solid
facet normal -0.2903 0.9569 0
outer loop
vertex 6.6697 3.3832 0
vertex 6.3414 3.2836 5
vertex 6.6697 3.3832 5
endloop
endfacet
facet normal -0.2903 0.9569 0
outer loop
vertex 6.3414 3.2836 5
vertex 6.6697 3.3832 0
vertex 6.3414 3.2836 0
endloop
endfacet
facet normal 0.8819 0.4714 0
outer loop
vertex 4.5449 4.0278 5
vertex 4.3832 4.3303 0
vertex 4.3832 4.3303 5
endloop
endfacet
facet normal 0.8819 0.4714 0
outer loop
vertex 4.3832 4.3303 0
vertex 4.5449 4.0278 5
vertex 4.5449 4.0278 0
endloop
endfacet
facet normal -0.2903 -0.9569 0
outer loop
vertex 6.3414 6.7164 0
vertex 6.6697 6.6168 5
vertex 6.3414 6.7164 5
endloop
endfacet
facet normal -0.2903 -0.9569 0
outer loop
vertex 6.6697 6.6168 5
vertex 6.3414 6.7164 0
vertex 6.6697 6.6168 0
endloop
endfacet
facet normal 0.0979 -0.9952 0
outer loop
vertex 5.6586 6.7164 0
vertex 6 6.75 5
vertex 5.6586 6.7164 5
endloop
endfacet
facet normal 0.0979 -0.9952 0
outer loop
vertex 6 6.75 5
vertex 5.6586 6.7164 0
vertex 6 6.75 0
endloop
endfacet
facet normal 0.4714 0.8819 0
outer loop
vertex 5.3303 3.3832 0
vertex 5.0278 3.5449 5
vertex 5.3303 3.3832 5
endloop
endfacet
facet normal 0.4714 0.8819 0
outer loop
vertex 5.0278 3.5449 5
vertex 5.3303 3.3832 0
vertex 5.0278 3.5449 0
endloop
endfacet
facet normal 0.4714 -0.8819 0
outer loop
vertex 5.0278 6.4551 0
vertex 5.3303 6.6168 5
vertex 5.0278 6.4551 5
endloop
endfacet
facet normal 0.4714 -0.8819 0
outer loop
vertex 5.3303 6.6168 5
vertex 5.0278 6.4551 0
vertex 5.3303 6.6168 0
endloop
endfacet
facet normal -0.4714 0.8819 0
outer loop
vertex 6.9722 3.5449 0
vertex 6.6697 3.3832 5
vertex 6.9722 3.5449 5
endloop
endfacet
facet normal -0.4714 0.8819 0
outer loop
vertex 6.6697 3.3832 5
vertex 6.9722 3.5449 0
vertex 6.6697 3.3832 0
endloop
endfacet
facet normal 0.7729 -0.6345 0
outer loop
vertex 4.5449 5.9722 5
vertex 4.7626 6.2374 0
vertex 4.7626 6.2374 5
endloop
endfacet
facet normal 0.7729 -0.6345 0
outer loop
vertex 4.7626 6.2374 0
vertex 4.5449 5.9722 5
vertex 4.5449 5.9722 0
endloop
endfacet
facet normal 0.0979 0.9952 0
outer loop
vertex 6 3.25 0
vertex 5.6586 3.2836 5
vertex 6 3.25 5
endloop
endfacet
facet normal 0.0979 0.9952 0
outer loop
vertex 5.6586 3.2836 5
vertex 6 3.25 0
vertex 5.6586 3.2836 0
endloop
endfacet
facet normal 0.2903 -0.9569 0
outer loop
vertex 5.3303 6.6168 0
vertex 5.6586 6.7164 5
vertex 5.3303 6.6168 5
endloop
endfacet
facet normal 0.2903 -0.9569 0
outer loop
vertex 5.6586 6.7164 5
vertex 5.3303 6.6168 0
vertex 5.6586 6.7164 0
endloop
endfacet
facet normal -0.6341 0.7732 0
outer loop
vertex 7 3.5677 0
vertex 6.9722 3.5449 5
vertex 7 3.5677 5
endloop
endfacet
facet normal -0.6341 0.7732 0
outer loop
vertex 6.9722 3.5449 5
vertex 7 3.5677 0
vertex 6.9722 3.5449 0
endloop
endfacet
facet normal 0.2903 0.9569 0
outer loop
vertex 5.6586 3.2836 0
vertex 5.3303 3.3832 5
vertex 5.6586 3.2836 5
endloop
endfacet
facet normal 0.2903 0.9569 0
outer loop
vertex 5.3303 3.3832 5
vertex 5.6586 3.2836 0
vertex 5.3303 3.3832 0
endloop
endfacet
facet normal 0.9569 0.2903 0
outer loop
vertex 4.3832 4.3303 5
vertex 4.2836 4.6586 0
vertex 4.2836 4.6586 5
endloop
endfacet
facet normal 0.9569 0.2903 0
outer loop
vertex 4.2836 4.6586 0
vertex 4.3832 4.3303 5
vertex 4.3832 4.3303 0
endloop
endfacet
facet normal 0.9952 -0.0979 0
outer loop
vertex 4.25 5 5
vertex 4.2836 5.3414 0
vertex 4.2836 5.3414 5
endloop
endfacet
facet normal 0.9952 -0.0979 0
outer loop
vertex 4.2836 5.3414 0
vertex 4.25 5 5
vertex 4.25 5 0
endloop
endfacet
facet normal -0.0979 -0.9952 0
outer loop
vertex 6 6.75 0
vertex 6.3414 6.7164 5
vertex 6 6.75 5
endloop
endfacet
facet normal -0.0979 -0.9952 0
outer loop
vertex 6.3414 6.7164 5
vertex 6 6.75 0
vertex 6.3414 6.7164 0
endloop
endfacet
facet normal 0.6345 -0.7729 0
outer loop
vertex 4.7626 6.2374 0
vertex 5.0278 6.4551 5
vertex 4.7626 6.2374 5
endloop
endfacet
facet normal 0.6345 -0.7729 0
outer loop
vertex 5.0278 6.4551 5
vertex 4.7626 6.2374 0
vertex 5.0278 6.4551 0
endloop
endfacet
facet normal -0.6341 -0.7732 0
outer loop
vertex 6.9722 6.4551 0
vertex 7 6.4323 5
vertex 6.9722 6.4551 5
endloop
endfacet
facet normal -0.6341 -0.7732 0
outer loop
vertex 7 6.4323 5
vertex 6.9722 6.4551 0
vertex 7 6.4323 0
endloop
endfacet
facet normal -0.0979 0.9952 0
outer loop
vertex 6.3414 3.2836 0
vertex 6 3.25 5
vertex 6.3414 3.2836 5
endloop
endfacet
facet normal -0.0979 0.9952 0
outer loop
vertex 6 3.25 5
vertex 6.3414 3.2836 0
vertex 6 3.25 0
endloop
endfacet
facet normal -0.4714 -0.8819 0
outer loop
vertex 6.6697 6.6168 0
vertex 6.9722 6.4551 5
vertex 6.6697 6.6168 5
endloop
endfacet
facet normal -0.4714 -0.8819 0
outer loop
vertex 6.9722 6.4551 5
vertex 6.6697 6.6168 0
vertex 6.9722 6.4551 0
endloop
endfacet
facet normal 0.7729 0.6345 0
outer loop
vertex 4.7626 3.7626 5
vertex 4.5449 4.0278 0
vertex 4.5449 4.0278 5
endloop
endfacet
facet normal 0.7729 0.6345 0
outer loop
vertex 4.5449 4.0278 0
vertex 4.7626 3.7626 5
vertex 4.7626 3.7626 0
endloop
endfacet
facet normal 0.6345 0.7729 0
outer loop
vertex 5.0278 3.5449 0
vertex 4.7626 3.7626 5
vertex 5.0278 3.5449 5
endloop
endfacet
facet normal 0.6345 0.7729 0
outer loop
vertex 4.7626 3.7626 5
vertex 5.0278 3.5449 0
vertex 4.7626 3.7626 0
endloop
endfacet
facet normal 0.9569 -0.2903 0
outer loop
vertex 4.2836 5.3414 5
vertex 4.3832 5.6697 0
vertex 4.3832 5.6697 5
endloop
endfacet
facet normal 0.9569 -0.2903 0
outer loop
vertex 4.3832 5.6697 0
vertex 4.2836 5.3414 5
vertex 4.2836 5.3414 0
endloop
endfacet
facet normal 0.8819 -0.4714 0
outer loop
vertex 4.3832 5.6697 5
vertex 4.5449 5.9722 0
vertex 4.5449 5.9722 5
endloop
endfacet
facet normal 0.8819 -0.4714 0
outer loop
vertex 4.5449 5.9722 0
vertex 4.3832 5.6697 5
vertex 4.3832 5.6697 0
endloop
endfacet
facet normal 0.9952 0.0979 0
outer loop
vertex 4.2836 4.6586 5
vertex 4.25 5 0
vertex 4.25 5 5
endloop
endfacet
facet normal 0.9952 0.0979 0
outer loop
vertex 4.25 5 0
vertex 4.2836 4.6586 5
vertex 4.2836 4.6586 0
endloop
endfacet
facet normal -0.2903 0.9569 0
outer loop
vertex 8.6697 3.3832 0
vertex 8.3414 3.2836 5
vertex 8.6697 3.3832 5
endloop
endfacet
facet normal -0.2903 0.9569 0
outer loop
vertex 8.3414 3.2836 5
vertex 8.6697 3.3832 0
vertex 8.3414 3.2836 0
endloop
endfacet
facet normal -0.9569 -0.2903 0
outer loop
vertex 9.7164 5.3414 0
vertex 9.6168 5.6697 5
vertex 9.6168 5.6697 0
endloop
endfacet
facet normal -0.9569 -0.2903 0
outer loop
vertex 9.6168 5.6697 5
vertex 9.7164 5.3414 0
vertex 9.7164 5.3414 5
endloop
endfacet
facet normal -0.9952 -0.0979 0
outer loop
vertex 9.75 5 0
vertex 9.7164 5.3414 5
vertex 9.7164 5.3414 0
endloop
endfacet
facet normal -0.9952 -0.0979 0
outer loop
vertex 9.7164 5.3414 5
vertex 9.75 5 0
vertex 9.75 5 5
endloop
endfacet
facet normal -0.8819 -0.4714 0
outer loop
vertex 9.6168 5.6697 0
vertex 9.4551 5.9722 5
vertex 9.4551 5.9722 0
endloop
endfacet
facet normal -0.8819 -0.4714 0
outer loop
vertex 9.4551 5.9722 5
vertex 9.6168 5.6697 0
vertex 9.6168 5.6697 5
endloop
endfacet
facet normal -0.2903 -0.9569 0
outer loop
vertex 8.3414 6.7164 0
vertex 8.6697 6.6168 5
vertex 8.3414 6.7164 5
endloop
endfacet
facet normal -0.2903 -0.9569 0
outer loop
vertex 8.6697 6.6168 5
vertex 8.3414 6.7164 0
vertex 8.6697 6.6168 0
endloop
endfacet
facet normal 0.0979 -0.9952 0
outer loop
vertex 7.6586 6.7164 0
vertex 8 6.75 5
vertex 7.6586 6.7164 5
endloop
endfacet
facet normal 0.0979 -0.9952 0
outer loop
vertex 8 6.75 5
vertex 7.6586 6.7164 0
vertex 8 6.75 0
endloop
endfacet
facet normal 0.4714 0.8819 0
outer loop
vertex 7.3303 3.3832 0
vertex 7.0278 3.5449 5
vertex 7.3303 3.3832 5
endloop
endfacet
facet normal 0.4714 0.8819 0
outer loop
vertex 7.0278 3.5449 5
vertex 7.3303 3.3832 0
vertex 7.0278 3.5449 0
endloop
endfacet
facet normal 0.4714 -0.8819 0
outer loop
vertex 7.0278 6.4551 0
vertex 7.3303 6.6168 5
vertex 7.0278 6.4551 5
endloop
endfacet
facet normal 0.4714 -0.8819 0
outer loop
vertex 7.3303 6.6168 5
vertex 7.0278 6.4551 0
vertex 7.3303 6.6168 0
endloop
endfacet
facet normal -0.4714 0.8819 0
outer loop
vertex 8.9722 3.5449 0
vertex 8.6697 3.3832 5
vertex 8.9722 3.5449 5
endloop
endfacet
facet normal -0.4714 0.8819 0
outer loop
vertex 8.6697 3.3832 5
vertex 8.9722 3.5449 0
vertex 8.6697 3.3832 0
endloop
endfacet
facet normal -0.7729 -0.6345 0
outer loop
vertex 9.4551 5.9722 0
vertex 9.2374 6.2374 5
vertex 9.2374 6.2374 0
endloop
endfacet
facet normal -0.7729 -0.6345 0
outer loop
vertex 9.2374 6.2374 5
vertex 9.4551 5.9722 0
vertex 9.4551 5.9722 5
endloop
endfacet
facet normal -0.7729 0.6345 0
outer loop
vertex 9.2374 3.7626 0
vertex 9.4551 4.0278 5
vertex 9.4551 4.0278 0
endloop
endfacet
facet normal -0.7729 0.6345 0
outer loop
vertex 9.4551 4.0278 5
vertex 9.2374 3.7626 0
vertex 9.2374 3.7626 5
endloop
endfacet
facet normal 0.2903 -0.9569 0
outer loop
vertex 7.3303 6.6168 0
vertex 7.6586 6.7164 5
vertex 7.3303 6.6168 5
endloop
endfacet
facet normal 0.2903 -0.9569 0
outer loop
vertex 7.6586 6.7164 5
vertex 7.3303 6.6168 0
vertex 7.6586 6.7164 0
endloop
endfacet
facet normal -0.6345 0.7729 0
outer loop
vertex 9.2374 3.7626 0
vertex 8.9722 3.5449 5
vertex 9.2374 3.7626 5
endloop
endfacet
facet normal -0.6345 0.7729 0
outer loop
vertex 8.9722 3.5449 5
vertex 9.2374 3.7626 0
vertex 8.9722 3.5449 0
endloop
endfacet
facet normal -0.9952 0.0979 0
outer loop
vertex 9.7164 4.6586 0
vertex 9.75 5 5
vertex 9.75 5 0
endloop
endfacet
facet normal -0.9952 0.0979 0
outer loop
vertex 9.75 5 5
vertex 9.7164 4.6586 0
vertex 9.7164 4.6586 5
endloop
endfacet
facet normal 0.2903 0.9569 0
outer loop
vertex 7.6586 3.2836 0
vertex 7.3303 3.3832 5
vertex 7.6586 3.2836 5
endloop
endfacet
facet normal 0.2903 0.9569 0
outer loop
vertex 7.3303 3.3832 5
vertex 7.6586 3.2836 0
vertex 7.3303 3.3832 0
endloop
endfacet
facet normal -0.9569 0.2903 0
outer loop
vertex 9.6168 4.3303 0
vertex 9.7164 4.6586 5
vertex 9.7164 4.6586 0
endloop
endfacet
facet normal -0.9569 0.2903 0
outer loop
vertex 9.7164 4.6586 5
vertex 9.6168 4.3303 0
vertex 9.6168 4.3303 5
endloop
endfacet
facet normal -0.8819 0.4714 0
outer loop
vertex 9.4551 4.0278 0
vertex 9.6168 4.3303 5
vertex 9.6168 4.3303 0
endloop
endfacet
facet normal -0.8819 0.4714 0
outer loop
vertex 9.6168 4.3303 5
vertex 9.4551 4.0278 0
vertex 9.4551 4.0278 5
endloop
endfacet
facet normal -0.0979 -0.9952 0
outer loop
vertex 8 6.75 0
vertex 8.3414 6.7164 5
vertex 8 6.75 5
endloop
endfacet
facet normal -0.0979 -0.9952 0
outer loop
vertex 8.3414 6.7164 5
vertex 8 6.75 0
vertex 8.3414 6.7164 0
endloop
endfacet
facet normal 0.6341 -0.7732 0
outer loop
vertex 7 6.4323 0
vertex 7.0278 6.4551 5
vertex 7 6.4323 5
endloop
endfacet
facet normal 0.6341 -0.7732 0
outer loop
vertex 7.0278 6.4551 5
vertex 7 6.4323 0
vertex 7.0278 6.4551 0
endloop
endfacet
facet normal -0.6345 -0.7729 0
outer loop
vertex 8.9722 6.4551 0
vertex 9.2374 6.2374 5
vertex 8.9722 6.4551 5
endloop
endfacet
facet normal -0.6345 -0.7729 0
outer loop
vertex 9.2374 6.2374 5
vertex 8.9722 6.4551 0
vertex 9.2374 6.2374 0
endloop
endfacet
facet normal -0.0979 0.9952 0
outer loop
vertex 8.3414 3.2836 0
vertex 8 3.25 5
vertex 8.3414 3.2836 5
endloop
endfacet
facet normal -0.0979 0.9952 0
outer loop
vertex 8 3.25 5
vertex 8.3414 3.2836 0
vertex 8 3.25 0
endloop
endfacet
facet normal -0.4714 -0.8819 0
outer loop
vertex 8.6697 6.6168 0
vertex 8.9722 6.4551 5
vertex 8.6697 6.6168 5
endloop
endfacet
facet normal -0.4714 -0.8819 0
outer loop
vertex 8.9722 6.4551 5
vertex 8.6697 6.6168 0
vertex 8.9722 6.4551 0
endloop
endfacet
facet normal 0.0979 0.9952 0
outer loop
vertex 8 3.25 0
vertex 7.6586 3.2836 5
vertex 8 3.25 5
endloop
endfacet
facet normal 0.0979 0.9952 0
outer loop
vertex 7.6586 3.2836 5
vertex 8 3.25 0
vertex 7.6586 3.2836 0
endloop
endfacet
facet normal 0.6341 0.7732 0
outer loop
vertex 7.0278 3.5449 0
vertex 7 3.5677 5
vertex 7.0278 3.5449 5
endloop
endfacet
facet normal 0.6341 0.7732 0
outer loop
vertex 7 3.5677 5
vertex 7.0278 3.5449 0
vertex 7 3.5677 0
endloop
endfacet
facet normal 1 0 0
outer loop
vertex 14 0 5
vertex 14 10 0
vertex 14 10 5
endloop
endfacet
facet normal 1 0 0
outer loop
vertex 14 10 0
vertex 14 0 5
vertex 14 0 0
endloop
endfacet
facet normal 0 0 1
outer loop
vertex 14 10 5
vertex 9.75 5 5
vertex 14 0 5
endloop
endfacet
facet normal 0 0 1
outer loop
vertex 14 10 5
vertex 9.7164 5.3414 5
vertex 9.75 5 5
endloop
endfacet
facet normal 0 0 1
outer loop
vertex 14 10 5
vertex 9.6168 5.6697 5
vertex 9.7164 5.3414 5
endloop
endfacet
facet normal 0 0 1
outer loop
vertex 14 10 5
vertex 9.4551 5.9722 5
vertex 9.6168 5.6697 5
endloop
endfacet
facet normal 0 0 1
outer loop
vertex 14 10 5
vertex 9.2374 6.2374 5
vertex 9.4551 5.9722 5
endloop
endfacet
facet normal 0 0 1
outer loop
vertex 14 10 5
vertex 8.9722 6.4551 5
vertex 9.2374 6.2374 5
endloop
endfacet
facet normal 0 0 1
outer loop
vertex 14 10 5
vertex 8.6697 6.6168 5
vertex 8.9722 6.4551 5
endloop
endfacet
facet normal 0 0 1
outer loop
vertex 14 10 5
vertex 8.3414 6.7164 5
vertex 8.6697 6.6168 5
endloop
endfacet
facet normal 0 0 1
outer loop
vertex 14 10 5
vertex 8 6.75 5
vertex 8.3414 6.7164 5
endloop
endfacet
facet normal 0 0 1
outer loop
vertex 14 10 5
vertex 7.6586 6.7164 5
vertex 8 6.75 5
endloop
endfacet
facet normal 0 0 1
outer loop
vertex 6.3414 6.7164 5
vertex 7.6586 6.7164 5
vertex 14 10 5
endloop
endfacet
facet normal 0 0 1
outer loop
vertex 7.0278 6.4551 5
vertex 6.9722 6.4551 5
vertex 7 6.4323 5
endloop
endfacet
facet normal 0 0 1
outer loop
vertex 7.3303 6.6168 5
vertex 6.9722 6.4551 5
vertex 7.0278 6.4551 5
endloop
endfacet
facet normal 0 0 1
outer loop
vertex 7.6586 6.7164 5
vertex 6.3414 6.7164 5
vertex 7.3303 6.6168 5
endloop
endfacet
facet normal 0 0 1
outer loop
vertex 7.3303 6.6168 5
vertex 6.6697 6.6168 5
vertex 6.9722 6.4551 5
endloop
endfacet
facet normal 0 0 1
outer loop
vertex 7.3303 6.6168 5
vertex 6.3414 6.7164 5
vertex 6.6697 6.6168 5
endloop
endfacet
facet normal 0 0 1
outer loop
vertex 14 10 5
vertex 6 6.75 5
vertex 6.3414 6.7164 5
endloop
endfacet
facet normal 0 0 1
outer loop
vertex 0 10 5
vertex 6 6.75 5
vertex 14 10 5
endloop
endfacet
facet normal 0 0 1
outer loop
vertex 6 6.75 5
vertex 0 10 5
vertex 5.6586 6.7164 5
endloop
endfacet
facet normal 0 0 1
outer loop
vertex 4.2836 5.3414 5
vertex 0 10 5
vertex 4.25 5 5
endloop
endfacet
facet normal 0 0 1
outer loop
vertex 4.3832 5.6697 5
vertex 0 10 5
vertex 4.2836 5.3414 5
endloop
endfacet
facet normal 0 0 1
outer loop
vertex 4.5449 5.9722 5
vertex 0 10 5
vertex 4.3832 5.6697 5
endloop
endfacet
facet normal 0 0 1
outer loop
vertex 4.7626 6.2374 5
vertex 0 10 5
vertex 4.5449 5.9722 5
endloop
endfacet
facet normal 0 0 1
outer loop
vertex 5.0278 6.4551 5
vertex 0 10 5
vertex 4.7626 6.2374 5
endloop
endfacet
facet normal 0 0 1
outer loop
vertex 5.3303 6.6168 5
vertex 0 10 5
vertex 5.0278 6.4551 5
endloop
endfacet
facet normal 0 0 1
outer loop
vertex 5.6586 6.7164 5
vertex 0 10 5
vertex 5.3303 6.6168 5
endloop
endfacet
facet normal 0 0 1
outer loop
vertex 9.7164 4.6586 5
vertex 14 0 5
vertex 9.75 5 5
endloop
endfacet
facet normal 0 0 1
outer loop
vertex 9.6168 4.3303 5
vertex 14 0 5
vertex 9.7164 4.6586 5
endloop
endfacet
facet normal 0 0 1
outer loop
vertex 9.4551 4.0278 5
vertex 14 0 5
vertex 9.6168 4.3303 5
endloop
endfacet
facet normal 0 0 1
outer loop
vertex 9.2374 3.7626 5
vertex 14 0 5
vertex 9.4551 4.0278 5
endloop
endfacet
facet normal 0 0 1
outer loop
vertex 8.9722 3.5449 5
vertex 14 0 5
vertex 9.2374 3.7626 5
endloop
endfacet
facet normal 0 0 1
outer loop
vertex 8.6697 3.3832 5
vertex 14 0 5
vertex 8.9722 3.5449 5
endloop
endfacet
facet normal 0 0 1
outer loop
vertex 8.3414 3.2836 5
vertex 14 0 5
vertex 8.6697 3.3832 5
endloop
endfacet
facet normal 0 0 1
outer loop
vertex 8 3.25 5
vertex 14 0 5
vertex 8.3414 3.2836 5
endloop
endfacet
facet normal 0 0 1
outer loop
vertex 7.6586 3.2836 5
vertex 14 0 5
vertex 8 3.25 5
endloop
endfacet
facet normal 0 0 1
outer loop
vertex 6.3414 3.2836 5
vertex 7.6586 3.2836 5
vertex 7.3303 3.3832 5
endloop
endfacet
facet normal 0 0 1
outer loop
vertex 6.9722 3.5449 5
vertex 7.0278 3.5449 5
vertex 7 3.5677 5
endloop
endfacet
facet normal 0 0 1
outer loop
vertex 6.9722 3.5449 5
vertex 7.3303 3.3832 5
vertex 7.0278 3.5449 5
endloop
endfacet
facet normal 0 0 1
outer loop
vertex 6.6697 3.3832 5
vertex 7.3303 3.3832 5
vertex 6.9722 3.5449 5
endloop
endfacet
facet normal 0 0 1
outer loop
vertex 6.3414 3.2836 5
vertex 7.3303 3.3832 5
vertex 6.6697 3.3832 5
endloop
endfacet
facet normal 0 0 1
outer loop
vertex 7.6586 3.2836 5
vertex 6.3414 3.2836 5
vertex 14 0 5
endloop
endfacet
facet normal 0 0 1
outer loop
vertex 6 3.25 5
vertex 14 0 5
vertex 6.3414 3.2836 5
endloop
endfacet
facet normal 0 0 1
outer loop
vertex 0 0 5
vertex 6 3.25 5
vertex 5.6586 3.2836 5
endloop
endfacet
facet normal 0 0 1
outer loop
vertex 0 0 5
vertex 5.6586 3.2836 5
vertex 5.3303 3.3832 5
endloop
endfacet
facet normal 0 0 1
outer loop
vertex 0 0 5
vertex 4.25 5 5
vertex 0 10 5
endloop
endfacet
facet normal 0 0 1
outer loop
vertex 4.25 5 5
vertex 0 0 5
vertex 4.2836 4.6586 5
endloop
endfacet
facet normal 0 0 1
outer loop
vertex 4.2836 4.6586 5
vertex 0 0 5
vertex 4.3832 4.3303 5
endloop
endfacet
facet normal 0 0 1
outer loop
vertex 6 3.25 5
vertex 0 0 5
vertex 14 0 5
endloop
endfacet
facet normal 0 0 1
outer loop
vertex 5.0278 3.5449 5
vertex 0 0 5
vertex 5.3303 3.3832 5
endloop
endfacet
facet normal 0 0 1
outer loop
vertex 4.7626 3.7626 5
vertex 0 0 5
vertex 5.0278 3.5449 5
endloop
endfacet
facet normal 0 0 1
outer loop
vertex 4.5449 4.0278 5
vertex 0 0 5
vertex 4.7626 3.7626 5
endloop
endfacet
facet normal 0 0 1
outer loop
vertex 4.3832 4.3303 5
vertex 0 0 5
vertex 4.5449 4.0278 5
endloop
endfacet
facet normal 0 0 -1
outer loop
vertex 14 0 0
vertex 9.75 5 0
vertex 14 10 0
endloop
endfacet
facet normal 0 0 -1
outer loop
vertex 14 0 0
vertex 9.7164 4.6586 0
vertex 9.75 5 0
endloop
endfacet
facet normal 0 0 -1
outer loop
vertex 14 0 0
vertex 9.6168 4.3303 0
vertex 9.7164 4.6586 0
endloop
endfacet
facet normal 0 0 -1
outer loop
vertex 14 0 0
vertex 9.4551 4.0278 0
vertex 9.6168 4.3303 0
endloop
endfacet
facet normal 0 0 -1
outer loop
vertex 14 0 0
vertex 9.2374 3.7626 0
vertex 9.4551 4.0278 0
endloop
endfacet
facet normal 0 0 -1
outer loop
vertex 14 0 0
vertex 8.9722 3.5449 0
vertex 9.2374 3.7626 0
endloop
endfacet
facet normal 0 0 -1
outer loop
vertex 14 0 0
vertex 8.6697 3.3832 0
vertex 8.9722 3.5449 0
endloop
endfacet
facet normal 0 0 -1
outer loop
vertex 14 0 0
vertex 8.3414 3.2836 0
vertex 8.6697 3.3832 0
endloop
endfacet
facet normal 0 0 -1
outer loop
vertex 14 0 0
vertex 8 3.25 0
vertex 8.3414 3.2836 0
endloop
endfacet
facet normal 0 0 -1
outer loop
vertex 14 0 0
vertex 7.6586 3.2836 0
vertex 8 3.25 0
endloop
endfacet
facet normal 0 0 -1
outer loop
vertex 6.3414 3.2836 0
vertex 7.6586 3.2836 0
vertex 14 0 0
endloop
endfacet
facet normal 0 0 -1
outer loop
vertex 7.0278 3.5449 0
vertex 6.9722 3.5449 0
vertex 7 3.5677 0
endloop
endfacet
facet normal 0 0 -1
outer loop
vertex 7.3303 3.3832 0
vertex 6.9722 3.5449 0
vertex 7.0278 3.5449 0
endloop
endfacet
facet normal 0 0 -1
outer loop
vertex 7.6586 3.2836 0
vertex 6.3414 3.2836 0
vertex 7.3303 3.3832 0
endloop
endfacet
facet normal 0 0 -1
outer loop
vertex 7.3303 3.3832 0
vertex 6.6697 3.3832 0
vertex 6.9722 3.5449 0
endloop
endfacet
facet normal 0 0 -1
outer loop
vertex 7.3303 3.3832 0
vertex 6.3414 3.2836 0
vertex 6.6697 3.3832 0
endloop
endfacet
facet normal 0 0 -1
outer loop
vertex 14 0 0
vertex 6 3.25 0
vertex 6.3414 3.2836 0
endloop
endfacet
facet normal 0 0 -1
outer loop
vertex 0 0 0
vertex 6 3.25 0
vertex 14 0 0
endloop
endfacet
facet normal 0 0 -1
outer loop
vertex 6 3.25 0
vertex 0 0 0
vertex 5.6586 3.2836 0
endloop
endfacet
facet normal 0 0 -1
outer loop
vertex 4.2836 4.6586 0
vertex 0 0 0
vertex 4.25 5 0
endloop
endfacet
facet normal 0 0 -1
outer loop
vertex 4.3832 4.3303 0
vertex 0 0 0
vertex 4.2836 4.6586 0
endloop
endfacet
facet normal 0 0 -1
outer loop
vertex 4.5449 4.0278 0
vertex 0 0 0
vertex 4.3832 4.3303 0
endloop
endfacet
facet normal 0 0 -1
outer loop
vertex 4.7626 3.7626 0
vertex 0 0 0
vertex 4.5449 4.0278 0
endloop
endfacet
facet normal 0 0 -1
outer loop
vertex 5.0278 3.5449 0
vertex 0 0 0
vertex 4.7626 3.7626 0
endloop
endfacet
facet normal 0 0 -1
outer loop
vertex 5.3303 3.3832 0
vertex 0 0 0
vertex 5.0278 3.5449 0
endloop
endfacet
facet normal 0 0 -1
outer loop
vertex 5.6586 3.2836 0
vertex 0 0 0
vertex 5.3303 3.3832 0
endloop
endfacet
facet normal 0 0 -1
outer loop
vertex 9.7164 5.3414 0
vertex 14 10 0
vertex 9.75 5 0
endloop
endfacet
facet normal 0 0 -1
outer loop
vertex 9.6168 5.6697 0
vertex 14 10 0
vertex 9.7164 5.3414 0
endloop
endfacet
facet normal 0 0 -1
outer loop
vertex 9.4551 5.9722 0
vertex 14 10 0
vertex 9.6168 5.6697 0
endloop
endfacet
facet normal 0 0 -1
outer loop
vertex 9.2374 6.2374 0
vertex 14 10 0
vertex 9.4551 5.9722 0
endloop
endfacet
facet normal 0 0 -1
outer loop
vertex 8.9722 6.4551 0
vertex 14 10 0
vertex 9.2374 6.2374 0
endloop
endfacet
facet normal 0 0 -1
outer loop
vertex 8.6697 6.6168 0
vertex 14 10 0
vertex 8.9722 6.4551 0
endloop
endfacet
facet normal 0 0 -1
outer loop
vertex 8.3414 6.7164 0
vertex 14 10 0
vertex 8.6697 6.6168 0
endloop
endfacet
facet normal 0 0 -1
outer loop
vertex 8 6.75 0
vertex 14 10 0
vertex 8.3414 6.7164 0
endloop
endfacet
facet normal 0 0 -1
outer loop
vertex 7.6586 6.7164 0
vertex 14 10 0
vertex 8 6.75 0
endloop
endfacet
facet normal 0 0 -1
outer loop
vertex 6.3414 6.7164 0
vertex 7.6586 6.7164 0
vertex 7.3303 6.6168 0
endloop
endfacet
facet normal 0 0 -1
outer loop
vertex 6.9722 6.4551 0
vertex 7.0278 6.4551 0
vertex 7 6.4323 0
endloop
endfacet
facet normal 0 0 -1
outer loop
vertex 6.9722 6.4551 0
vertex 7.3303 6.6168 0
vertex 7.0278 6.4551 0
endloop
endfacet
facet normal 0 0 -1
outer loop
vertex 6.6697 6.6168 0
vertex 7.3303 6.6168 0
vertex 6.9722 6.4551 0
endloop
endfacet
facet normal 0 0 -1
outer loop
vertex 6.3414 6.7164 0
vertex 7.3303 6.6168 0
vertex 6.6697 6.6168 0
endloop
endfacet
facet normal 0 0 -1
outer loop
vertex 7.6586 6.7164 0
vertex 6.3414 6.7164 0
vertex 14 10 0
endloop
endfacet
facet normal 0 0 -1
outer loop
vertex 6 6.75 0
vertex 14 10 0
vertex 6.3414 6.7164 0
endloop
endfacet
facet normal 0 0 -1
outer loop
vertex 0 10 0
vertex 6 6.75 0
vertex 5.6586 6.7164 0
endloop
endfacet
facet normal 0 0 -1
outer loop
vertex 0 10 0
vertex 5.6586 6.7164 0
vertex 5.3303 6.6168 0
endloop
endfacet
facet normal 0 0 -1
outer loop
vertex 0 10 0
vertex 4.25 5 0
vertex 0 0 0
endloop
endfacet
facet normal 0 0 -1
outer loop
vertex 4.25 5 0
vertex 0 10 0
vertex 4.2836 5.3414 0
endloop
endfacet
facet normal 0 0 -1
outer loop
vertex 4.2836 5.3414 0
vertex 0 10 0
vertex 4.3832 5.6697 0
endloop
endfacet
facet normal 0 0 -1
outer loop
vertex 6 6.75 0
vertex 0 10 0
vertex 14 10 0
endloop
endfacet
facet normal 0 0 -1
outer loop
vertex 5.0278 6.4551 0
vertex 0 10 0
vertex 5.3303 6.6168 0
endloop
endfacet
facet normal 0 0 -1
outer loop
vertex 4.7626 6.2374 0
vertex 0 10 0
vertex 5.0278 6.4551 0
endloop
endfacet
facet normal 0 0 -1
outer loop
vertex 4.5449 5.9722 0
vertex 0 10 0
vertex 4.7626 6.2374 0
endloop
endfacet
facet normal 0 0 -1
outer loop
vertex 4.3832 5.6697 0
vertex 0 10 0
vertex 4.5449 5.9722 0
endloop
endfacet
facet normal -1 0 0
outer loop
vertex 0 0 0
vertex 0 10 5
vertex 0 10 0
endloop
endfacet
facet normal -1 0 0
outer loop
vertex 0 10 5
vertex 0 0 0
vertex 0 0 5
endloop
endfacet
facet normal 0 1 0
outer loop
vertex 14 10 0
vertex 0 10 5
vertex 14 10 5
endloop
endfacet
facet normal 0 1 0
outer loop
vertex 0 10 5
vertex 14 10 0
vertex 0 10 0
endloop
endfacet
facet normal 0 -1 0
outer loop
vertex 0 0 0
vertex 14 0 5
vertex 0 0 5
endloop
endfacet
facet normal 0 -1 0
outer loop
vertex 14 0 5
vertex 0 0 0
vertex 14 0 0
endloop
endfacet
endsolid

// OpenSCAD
$fn = 32;

// ----------------------------------------------------------------------
// Micro pad: two-hole pad, 5-20 mm class
// ----------------------------------------------------------------------

// --- parameters (mm) ---
pad_l = 14;               // pad length, X
pad_w = 10;               // pad width, Y
pad_t = 5;                // pad thickness, Z
hole_d = 3.5;             // hole diameter
hole_x = 6;               // X of the first hole centre

difference() {
  cube([pad_l, pad_w, pad_t]);
  for (x = [hole_x, pad_l - hole_x])
    translate([x, pad_w / 2, -1])
      cylinder(h = pad_t + 2, d = hole_d);
}
